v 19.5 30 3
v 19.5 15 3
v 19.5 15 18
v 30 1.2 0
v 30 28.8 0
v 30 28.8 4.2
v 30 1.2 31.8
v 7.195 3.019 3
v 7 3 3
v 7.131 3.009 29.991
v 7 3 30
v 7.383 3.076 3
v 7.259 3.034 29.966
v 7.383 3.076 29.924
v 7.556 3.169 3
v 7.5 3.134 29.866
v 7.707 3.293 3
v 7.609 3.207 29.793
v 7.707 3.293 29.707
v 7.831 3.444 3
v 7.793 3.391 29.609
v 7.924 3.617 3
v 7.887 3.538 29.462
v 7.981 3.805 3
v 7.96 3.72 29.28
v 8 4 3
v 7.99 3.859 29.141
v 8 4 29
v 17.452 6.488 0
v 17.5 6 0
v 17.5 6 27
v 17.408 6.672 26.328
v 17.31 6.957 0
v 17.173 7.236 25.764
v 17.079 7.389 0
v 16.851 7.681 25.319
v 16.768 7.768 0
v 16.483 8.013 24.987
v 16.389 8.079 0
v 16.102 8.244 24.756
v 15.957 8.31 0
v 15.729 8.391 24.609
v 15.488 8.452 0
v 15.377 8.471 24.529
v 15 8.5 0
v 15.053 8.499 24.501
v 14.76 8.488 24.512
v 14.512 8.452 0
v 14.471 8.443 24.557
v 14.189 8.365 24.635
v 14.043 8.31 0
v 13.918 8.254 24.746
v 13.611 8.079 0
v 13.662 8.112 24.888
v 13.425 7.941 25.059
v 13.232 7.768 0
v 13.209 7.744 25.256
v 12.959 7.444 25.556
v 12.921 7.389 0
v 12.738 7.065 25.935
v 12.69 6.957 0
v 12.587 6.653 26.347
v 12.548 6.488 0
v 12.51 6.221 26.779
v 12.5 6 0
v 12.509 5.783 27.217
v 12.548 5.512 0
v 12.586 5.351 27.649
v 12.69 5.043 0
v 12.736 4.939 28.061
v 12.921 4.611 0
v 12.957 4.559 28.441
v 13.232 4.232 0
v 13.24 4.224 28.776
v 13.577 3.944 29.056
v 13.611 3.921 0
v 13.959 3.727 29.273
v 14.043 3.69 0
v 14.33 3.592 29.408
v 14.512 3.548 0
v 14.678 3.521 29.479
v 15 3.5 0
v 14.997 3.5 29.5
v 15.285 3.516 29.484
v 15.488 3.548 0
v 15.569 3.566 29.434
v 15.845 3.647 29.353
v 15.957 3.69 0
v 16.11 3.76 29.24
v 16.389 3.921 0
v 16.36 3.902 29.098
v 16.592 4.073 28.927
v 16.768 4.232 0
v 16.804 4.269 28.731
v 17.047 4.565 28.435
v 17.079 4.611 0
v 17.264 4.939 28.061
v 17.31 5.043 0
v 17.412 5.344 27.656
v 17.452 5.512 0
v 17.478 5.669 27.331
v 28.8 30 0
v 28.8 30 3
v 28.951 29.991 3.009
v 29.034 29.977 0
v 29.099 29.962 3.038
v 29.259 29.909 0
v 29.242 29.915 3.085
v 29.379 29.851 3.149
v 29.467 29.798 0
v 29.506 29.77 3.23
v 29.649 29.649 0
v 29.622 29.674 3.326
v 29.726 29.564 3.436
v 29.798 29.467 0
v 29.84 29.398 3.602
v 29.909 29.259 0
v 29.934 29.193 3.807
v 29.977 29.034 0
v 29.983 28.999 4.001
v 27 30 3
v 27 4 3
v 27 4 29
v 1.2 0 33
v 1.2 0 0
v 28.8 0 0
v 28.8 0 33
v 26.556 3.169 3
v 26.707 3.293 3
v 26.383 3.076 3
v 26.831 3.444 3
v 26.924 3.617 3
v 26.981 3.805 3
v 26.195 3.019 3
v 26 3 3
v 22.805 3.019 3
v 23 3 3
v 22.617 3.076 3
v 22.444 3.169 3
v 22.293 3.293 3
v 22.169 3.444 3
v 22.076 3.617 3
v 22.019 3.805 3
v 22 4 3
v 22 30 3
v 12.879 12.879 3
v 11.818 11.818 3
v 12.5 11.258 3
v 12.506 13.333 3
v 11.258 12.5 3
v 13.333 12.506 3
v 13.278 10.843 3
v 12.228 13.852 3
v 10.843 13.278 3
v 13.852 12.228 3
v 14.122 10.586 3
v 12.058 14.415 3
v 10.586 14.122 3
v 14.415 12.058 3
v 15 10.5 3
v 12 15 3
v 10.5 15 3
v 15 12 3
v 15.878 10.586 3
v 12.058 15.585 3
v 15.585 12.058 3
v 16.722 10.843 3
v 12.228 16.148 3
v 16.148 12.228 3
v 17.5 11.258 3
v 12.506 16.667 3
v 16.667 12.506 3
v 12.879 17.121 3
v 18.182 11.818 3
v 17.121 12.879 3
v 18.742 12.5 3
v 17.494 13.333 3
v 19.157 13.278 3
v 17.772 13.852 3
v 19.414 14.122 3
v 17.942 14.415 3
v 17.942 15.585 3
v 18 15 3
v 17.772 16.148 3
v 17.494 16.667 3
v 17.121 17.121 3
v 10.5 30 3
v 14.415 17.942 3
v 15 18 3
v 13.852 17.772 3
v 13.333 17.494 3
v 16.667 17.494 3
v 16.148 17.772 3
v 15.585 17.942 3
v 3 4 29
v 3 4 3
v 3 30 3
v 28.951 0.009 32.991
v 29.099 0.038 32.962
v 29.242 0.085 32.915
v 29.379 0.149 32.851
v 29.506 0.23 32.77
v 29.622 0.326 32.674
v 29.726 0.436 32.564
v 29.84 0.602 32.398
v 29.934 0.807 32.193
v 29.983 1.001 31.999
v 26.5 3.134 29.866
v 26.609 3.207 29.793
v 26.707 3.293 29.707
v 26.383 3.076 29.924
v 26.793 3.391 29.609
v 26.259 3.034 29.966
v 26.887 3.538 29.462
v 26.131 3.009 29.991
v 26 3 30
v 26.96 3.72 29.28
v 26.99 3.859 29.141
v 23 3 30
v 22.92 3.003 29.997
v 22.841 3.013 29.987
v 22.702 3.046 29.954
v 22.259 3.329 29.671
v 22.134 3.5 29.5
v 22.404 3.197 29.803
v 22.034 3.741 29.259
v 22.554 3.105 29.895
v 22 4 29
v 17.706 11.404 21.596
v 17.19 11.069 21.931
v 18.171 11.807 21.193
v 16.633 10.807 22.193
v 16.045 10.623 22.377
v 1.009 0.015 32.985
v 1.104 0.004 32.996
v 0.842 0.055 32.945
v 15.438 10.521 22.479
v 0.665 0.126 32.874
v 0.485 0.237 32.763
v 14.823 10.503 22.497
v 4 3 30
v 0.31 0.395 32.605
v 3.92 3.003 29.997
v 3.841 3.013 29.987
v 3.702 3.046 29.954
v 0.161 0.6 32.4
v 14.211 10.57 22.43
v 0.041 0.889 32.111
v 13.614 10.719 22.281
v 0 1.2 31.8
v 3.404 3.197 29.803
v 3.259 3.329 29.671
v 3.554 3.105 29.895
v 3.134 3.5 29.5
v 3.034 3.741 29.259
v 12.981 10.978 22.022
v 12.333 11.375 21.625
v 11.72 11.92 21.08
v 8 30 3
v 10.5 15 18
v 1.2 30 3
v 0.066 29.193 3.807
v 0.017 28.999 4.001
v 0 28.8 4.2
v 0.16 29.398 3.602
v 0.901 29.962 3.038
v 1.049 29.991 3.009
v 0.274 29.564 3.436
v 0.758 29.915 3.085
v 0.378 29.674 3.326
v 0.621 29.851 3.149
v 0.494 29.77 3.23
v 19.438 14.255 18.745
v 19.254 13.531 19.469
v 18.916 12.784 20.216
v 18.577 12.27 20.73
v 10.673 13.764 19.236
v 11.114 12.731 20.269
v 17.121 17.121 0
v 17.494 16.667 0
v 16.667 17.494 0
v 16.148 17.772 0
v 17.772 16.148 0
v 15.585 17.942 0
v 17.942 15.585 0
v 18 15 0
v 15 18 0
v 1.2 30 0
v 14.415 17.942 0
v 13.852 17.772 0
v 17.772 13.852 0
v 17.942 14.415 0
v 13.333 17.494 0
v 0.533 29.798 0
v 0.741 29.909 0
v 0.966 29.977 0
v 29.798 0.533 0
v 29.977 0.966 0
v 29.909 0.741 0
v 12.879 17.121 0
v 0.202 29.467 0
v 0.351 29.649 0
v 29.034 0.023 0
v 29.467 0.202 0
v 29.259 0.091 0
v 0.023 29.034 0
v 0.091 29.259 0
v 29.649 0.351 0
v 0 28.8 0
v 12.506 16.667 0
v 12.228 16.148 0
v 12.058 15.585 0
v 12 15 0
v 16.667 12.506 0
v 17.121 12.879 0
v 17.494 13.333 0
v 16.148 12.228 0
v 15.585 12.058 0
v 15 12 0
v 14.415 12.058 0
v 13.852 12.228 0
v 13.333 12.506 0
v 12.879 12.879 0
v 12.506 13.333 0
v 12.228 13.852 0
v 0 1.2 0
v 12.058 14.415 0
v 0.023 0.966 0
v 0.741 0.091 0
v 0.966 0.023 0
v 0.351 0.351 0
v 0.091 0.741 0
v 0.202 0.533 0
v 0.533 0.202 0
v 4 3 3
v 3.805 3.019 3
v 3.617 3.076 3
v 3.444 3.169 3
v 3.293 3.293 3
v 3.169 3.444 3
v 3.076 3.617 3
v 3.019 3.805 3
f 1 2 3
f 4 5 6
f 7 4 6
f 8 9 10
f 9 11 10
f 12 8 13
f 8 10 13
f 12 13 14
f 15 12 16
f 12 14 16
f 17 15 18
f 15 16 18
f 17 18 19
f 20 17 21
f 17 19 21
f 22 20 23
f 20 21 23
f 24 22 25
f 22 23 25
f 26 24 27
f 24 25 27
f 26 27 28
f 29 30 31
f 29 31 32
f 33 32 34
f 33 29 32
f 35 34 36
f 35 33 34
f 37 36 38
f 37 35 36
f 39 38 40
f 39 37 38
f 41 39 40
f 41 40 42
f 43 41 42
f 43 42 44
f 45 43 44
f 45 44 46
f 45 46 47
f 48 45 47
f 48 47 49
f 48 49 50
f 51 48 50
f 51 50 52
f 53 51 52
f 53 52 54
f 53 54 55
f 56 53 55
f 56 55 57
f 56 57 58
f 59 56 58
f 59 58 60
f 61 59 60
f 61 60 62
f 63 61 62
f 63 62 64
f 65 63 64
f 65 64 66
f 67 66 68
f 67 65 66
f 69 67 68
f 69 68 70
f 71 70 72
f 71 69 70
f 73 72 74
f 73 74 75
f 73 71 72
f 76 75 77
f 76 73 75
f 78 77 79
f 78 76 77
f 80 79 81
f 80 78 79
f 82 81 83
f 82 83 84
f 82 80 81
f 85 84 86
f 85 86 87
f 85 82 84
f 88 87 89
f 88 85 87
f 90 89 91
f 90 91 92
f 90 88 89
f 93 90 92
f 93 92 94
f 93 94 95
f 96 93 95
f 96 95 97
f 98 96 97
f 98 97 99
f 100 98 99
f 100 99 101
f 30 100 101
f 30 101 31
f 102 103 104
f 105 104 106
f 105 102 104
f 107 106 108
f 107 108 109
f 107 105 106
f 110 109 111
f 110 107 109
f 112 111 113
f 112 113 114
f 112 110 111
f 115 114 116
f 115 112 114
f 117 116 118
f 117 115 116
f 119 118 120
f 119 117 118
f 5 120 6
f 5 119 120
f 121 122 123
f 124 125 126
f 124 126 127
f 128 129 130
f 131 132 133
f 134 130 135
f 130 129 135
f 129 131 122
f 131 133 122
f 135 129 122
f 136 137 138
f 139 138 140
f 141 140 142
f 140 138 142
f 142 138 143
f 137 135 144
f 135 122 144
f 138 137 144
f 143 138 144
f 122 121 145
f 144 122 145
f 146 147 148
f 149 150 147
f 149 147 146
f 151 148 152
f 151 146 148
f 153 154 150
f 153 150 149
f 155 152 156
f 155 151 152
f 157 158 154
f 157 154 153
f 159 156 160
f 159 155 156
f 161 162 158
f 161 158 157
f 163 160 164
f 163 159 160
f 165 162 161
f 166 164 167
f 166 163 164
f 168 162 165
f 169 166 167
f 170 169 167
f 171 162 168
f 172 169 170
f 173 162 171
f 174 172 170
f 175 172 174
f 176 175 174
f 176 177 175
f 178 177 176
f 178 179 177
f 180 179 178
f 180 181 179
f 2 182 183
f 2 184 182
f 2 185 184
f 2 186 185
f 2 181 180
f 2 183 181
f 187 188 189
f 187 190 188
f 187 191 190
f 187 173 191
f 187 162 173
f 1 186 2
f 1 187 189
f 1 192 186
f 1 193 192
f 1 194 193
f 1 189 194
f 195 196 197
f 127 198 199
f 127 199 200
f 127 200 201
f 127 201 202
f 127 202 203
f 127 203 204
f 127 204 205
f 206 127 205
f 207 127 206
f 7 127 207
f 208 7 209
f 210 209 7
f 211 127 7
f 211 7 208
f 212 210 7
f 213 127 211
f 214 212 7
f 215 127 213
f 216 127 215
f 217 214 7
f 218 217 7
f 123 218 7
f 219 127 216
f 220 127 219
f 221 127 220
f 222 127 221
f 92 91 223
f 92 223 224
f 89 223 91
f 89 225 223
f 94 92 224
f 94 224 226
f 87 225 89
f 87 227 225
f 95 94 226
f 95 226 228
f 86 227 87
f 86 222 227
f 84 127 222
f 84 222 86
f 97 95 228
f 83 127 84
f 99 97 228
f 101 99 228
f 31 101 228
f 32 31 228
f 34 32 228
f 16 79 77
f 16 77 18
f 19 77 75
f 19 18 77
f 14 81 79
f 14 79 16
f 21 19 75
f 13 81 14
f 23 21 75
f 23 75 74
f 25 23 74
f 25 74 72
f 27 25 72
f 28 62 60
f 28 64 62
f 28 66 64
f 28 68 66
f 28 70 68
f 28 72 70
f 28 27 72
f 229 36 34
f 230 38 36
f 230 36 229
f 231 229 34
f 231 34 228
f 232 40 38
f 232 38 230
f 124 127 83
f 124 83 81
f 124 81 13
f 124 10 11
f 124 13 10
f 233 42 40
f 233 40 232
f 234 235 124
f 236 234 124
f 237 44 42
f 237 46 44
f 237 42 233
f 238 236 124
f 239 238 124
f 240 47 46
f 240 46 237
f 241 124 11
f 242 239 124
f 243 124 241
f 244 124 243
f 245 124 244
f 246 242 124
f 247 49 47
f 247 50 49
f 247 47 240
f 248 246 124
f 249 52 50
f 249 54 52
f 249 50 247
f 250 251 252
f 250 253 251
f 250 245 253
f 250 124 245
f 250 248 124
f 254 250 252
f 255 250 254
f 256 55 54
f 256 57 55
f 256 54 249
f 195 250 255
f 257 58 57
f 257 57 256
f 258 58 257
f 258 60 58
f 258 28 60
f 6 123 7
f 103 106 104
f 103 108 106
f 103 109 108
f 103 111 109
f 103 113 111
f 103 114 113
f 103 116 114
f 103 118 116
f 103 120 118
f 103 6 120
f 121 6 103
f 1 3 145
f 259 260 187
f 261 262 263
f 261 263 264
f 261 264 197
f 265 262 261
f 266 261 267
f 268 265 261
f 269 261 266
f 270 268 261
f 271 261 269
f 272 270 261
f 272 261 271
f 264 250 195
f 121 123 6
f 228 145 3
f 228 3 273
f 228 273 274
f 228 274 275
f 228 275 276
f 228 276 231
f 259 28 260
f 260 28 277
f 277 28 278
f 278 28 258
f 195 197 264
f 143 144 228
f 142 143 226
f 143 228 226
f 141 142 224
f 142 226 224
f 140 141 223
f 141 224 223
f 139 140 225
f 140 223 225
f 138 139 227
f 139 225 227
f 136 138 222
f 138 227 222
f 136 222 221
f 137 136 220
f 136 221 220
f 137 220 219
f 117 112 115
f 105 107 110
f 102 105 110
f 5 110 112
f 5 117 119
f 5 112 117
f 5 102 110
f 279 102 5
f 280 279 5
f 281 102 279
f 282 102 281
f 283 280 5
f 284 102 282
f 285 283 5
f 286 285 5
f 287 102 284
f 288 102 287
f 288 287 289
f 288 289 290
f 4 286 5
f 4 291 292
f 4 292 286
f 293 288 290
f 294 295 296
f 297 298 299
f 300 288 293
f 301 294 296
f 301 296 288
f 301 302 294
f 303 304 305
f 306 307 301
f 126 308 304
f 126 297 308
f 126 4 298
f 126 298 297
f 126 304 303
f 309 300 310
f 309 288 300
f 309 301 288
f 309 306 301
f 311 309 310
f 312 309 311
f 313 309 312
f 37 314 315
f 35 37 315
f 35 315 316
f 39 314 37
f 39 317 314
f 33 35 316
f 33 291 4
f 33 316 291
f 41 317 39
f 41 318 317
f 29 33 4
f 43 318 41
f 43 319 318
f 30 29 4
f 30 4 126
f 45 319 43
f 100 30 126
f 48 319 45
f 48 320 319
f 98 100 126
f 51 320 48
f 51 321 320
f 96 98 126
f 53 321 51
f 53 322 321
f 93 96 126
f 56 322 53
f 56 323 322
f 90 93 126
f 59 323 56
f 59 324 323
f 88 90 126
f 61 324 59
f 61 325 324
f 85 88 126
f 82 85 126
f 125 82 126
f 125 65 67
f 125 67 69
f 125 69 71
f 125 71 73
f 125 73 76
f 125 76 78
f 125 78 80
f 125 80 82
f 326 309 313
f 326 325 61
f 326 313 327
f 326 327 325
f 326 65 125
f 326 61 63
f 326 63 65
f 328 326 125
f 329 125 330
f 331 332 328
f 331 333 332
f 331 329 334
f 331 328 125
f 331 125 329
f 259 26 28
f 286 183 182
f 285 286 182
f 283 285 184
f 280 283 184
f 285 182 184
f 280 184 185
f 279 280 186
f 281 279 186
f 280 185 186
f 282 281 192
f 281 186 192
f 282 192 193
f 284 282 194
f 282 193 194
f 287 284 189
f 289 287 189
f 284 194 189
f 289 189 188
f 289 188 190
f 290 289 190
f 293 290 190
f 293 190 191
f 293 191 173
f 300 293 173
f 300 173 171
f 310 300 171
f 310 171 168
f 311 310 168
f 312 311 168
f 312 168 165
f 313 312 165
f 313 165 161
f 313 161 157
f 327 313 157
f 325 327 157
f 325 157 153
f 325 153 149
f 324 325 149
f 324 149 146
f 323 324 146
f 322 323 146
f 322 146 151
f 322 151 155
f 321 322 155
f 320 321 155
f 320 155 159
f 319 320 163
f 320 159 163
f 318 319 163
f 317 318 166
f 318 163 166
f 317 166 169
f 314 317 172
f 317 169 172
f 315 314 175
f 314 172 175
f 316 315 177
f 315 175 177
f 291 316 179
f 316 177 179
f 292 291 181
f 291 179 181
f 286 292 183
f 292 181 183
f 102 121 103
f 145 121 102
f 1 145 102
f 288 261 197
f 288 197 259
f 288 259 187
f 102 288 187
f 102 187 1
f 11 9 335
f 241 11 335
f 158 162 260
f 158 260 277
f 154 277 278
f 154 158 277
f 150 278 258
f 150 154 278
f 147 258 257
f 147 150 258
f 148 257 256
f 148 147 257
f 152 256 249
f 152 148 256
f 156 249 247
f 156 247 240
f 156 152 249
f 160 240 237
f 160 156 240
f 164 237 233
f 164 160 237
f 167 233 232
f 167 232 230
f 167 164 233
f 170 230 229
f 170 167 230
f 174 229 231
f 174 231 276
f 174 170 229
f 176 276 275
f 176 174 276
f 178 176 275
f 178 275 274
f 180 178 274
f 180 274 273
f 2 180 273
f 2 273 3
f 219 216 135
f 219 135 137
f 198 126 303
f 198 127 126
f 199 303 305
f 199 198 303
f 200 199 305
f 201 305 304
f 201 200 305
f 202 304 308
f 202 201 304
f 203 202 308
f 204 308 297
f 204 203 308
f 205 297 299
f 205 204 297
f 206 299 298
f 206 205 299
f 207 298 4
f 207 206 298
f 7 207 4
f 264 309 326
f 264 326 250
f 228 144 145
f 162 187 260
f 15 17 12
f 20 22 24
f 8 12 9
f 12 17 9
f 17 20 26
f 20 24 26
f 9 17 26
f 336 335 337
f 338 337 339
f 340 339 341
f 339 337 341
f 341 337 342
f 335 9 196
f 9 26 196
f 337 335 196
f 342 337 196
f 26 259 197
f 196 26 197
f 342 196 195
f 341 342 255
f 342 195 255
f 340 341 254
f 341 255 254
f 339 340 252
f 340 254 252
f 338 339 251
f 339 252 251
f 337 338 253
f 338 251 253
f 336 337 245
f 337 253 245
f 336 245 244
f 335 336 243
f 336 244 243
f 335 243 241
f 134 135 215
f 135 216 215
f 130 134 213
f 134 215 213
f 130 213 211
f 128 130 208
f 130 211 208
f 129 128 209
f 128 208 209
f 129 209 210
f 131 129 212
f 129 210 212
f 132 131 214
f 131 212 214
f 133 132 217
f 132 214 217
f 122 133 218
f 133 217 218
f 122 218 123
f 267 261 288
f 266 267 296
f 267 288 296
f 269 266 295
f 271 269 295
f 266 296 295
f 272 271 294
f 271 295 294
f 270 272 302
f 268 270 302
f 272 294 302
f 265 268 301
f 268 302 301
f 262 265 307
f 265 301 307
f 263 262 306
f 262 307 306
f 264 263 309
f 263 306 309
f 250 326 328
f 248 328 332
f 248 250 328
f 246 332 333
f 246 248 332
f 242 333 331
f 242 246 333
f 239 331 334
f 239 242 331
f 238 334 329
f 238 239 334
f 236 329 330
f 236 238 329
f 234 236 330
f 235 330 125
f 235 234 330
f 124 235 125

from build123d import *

# Parameters (mm, degrees)
EXTRUDE_1_DEPTH     = 30
SKETCH_2_W          = 5
SKETCH_2_H          = 54
CUT_EXTRUDE_1_DEPTH = 45
FILLET_1_R          = 1
SKETCH_4_R          = 3
CUT_EXTRUDE_2_DEPTH = 45
SKETCH_5_R          = 2.5
CUT_EXTRUDE_3_DEPTH = 92
FILLET_2_R          = 1.2


with BuildPart() as part:
    # 草图1 → 凸台-拉伸1 (new body)
    with BuildSketch(Plane(origin=(0, 0, 0), x_dir=(0, 0, -1), z_dir=(1, 0, 0))):
        Polygon((0, 30), (0, 0), (-33, 0), (-3, 30), align=None)
    extrude(amount=EXTRUDE_1_DEPTH)

    # 草图2 → 切除-拉伸1 (cut)
    with BuildSketch(Plane(origin=(0, 0, 3), x_dir=(-1, 0, 0), z_dir=(0, 0, -1))):
        with BuildLine():
            Line((-19.5, 15), (-19.5, 31.772972214))
            ThreePointArc((-19.5, 31.772972214), (-15, 36.272972214), (-10.5, 31.772972214))
            Line((-10.5, 31.772972214), (-10.5, 15))
            ThreePointArc((-10.5, 15), (-15, 10.5), (-19.5, 15))
        make_face()
        with Locations((-5.5, 30)):
            Rectangle(SKETCH_2_W, SKETCH_2_H)
        with Locations((-24.5, 30)):
            Rectangle(SKETCH_2_W, SKETCH_2_H)
    extrude(amount=-CUT_EXTRUDE_1_DEPTH, mode=Mode.SUBTRACT)

    # 圆角1
    fillet_1_edges = [part.edges().sort_by_distance(p)[0] for p in [
        (27, 3, 16.5),
        (22, 3, 16.5),
        (8, 3, 16.5),
        (3, 3, 16.5),
    ]]
    fillet(fillet_1_edges, radius=FILLET_1_R)

    # 草图4 → 切除-拉伸2 (cut)
    with BuildSketch(Plane.XY.offset(3)):
        with Locations((15, 15)):
            Circle(SKETCH_4_R)
    extrude(amount=-CUT_EXTRUDE_2_DEPTH, mode=Mode.SUBTRACT)

    # 草图5 → 切除-拉伸3 (cut)
    with BuildSketch(Plane.XY):
        with Locations((15, 6)):
            Circle(SKETCH_5_R)
    extrude(amount=CUT_EXTRUDE_3_DEPTH, mode=Mode.SUBTRACT)

    # 圆角2
    fillet_2_edges = [part.edges().sort_by_distance(p)[0] for p in [
        (30, 0, 16.5),
        (30, 30, 1.5),
        (0, 0, 16.5),
        (0, 30, 1.5),
    ]]
    fillet(fillet_2_edges, radius=FILLET_2_R)


solid = part.part
